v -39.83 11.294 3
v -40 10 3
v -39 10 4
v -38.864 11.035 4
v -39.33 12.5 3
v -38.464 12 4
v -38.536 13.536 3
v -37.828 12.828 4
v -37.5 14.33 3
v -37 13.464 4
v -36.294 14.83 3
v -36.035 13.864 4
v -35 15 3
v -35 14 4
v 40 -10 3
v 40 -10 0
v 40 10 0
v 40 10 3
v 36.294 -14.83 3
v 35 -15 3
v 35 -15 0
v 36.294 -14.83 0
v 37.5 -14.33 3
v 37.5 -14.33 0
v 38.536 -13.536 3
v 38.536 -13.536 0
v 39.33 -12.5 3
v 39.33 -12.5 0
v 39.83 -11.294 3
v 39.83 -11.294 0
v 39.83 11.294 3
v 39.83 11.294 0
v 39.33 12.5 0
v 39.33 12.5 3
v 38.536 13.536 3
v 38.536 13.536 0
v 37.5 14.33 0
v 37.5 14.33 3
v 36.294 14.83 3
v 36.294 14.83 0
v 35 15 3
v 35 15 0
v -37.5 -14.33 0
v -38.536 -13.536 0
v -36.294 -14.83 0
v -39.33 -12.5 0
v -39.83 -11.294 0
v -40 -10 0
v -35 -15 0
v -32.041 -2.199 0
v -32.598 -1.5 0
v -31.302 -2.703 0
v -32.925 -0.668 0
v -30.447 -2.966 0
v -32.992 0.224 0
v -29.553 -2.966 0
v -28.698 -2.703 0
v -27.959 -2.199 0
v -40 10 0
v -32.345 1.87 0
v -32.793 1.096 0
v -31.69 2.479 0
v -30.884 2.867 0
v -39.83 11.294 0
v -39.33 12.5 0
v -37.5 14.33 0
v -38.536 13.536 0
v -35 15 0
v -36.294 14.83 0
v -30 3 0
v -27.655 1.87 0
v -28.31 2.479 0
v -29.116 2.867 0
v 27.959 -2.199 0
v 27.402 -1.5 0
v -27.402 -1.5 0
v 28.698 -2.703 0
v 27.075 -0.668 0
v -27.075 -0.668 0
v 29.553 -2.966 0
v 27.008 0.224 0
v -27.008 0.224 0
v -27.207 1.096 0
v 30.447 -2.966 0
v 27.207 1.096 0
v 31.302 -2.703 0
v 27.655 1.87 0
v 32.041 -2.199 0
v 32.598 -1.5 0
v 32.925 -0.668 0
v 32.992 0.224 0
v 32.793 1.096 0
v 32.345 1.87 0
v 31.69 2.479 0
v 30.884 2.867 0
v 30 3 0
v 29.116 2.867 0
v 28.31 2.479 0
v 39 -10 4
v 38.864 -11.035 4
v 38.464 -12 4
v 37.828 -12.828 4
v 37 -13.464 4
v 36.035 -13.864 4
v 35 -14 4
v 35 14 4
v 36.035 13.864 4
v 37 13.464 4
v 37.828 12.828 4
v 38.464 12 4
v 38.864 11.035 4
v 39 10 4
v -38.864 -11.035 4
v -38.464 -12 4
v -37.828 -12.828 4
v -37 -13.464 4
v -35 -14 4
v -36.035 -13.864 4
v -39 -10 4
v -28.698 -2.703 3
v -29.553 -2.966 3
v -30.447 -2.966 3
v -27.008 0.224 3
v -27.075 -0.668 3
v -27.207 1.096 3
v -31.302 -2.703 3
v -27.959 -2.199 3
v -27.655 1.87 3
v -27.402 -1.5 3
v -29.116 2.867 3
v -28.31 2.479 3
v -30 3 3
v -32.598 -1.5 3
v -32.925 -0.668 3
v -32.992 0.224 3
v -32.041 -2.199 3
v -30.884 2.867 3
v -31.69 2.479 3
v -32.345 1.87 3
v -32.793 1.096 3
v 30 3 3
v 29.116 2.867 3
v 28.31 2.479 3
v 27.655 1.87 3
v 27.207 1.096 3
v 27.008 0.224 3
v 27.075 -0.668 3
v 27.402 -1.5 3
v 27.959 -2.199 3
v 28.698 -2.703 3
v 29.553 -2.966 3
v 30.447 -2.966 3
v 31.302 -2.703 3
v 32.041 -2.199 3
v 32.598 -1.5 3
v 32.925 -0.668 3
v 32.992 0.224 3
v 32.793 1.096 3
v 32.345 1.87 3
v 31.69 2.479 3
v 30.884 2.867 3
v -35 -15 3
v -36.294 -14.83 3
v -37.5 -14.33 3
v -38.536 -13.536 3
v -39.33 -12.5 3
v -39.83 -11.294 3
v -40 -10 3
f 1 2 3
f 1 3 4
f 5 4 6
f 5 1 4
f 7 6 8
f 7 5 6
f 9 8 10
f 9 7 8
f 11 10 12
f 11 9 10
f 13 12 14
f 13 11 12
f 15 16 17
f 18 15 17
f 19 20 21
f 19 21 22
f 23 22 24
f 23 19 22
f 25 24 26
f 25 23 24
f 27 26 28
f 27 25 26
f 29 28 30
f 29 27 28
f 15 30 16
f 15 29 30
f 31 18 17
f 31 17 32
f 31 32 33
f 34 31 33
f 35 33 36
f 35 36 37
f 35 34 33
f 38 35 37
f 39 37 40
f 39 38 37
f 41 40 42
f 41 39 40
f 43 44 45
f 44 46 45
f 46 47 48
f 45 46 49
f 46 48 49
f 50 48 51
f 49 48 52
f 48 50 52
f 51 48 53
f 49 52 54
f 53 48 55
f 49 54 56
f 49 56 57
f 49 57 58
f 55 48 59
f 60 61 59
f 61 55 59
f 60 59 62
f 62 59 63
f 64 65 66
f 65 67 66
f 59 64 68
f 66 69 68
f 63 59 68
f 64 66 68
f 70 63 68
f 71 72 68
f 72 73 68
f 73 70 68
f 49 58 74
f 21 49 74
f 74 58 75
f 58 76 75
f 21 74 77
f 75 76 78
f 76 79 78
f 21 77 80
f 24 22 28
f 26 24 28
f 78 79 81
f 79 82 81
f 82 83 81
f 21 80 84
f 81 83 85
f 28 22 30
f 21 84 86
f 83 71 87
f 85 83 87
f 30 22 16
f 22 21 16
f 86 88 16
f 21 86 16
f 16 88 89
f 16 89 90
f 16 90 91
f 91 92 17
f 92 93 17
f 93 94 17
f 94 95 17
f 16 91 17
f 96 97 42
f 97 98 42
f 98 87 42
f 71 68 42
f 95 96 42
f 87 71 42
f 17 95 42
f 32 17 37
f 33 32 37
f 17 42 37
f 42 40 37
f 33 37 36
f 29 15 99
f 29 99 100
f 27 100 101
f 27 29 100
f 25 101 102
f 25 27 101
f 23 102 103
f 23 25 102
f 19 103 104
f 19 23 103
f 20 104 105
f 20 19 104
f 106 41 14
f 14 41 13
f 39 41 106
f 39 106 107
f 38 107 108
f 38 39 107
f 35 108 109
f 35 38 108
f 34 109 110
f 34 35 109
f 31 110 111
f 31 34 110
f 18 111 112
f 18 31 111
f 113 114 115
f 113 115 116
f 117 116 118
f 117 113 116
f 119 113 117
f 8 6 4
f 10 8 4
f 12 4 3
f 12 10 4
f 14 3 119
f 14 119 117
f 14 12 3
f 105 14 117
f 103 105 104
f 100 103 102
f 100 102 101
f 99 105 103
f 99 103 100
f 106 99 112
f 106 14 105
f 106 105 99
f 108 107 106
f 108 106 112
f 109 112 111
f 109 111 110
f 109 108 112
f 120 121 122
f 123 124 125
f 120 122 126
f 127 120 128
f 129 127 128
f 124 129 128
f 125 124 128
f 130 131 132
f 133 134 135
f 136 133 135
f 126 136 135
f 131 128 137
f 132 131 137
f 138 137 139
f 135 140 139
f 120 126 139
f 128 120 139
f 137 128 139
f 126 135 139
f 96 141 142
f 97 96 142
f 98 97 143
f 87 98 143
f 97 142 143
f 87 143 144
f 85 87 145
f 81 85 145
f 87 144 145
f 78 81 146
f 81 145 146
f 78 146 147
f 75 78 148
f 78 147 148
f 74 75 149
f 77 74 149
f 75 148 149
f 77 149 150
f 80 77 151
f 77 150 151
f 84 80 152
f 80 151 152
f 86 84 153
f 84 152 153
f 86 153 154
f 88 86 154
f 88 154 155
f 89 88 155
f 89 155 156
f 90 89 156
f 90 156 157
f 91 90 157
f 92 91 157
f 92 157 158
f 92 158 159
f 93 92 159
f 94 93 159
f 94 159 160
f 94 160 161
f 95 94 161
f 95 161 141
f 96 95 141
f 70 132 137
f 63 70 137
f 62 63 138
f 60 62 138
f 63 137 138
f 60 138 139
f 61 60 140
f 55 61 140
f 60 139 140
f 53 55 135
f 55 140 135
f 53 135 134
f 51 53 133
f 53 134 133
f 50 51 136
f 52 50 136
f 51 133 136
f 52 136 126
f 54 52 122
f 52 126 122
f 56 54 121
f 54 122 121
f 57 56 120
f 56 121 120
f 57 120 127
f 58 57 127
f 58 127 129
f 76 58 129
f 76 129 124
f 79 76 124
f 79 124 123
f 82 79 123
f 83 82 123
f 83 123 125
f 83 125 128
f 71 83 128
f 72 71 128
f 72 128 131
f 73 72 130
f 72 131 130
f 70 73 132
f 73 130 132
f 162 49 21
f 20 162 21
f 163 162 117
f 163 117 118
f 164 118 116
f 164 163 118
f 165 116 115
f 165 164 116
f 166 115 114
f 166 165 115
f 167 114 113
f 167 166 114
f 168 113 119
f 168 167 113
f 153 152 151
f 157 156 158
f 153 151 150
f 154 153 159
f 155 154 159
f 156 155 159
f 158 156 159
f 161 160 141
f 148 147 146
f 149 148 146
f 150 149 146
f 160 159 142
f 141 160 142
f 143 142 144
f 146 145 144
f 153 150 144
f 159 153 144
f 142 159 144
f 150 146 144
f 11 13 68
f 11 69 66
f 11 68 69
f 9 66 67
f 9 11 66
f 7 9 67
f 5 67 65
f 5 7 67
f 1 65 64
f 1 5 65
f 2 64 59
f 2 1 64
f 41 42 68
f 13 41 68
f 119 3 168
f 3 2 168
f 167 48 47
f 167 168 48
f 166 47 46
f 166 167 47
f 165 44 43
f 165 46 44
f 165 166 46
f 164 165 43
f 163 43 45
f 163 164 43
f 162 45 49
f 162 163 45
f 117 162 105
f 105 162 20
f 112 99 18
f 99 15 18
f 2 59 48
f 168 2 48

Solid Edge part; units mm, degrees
sketch "Sketch1" plane through (0, 0, 0) normal (0, 0, 1) x (1, 0, 0)
  line L0 (-40, -15) -> (40, -15)
  line L1 (40, -15) -> (40, 15)
  line L2 (40, 15) -> (-40, 15)
  line L3 (-40, 15) -> (-40, -15)
extrude "Protrusion1" add sketch "Sketch1" along normal blind 4
hole "Hole_1" at (30, 0, 0) direction (0, 0, 1) diameter 6 depth 3
hole "Hole1" at (-30, 0, 0) direction (0, 0, 1) diameter 6 depth 3
fillet "Round_1" radius 5 4 edges at (-40, 15, 2) (-40, -15, 2) (40, -15, 2) (40, 15, 2)
chamfer "Chamfer_1" distance 1 angle 45 8 edges at (-40, 0, 4) (-38.5355, -13.5355, 4) (0, -15, 4) (38.5355, -13.5355, 4) (40, 0, 4) (38.5355, 13.5355, 4) (0, 15, 4) (-38.5355, 13.5355, 4)
properties material "Bronze, 90%"
